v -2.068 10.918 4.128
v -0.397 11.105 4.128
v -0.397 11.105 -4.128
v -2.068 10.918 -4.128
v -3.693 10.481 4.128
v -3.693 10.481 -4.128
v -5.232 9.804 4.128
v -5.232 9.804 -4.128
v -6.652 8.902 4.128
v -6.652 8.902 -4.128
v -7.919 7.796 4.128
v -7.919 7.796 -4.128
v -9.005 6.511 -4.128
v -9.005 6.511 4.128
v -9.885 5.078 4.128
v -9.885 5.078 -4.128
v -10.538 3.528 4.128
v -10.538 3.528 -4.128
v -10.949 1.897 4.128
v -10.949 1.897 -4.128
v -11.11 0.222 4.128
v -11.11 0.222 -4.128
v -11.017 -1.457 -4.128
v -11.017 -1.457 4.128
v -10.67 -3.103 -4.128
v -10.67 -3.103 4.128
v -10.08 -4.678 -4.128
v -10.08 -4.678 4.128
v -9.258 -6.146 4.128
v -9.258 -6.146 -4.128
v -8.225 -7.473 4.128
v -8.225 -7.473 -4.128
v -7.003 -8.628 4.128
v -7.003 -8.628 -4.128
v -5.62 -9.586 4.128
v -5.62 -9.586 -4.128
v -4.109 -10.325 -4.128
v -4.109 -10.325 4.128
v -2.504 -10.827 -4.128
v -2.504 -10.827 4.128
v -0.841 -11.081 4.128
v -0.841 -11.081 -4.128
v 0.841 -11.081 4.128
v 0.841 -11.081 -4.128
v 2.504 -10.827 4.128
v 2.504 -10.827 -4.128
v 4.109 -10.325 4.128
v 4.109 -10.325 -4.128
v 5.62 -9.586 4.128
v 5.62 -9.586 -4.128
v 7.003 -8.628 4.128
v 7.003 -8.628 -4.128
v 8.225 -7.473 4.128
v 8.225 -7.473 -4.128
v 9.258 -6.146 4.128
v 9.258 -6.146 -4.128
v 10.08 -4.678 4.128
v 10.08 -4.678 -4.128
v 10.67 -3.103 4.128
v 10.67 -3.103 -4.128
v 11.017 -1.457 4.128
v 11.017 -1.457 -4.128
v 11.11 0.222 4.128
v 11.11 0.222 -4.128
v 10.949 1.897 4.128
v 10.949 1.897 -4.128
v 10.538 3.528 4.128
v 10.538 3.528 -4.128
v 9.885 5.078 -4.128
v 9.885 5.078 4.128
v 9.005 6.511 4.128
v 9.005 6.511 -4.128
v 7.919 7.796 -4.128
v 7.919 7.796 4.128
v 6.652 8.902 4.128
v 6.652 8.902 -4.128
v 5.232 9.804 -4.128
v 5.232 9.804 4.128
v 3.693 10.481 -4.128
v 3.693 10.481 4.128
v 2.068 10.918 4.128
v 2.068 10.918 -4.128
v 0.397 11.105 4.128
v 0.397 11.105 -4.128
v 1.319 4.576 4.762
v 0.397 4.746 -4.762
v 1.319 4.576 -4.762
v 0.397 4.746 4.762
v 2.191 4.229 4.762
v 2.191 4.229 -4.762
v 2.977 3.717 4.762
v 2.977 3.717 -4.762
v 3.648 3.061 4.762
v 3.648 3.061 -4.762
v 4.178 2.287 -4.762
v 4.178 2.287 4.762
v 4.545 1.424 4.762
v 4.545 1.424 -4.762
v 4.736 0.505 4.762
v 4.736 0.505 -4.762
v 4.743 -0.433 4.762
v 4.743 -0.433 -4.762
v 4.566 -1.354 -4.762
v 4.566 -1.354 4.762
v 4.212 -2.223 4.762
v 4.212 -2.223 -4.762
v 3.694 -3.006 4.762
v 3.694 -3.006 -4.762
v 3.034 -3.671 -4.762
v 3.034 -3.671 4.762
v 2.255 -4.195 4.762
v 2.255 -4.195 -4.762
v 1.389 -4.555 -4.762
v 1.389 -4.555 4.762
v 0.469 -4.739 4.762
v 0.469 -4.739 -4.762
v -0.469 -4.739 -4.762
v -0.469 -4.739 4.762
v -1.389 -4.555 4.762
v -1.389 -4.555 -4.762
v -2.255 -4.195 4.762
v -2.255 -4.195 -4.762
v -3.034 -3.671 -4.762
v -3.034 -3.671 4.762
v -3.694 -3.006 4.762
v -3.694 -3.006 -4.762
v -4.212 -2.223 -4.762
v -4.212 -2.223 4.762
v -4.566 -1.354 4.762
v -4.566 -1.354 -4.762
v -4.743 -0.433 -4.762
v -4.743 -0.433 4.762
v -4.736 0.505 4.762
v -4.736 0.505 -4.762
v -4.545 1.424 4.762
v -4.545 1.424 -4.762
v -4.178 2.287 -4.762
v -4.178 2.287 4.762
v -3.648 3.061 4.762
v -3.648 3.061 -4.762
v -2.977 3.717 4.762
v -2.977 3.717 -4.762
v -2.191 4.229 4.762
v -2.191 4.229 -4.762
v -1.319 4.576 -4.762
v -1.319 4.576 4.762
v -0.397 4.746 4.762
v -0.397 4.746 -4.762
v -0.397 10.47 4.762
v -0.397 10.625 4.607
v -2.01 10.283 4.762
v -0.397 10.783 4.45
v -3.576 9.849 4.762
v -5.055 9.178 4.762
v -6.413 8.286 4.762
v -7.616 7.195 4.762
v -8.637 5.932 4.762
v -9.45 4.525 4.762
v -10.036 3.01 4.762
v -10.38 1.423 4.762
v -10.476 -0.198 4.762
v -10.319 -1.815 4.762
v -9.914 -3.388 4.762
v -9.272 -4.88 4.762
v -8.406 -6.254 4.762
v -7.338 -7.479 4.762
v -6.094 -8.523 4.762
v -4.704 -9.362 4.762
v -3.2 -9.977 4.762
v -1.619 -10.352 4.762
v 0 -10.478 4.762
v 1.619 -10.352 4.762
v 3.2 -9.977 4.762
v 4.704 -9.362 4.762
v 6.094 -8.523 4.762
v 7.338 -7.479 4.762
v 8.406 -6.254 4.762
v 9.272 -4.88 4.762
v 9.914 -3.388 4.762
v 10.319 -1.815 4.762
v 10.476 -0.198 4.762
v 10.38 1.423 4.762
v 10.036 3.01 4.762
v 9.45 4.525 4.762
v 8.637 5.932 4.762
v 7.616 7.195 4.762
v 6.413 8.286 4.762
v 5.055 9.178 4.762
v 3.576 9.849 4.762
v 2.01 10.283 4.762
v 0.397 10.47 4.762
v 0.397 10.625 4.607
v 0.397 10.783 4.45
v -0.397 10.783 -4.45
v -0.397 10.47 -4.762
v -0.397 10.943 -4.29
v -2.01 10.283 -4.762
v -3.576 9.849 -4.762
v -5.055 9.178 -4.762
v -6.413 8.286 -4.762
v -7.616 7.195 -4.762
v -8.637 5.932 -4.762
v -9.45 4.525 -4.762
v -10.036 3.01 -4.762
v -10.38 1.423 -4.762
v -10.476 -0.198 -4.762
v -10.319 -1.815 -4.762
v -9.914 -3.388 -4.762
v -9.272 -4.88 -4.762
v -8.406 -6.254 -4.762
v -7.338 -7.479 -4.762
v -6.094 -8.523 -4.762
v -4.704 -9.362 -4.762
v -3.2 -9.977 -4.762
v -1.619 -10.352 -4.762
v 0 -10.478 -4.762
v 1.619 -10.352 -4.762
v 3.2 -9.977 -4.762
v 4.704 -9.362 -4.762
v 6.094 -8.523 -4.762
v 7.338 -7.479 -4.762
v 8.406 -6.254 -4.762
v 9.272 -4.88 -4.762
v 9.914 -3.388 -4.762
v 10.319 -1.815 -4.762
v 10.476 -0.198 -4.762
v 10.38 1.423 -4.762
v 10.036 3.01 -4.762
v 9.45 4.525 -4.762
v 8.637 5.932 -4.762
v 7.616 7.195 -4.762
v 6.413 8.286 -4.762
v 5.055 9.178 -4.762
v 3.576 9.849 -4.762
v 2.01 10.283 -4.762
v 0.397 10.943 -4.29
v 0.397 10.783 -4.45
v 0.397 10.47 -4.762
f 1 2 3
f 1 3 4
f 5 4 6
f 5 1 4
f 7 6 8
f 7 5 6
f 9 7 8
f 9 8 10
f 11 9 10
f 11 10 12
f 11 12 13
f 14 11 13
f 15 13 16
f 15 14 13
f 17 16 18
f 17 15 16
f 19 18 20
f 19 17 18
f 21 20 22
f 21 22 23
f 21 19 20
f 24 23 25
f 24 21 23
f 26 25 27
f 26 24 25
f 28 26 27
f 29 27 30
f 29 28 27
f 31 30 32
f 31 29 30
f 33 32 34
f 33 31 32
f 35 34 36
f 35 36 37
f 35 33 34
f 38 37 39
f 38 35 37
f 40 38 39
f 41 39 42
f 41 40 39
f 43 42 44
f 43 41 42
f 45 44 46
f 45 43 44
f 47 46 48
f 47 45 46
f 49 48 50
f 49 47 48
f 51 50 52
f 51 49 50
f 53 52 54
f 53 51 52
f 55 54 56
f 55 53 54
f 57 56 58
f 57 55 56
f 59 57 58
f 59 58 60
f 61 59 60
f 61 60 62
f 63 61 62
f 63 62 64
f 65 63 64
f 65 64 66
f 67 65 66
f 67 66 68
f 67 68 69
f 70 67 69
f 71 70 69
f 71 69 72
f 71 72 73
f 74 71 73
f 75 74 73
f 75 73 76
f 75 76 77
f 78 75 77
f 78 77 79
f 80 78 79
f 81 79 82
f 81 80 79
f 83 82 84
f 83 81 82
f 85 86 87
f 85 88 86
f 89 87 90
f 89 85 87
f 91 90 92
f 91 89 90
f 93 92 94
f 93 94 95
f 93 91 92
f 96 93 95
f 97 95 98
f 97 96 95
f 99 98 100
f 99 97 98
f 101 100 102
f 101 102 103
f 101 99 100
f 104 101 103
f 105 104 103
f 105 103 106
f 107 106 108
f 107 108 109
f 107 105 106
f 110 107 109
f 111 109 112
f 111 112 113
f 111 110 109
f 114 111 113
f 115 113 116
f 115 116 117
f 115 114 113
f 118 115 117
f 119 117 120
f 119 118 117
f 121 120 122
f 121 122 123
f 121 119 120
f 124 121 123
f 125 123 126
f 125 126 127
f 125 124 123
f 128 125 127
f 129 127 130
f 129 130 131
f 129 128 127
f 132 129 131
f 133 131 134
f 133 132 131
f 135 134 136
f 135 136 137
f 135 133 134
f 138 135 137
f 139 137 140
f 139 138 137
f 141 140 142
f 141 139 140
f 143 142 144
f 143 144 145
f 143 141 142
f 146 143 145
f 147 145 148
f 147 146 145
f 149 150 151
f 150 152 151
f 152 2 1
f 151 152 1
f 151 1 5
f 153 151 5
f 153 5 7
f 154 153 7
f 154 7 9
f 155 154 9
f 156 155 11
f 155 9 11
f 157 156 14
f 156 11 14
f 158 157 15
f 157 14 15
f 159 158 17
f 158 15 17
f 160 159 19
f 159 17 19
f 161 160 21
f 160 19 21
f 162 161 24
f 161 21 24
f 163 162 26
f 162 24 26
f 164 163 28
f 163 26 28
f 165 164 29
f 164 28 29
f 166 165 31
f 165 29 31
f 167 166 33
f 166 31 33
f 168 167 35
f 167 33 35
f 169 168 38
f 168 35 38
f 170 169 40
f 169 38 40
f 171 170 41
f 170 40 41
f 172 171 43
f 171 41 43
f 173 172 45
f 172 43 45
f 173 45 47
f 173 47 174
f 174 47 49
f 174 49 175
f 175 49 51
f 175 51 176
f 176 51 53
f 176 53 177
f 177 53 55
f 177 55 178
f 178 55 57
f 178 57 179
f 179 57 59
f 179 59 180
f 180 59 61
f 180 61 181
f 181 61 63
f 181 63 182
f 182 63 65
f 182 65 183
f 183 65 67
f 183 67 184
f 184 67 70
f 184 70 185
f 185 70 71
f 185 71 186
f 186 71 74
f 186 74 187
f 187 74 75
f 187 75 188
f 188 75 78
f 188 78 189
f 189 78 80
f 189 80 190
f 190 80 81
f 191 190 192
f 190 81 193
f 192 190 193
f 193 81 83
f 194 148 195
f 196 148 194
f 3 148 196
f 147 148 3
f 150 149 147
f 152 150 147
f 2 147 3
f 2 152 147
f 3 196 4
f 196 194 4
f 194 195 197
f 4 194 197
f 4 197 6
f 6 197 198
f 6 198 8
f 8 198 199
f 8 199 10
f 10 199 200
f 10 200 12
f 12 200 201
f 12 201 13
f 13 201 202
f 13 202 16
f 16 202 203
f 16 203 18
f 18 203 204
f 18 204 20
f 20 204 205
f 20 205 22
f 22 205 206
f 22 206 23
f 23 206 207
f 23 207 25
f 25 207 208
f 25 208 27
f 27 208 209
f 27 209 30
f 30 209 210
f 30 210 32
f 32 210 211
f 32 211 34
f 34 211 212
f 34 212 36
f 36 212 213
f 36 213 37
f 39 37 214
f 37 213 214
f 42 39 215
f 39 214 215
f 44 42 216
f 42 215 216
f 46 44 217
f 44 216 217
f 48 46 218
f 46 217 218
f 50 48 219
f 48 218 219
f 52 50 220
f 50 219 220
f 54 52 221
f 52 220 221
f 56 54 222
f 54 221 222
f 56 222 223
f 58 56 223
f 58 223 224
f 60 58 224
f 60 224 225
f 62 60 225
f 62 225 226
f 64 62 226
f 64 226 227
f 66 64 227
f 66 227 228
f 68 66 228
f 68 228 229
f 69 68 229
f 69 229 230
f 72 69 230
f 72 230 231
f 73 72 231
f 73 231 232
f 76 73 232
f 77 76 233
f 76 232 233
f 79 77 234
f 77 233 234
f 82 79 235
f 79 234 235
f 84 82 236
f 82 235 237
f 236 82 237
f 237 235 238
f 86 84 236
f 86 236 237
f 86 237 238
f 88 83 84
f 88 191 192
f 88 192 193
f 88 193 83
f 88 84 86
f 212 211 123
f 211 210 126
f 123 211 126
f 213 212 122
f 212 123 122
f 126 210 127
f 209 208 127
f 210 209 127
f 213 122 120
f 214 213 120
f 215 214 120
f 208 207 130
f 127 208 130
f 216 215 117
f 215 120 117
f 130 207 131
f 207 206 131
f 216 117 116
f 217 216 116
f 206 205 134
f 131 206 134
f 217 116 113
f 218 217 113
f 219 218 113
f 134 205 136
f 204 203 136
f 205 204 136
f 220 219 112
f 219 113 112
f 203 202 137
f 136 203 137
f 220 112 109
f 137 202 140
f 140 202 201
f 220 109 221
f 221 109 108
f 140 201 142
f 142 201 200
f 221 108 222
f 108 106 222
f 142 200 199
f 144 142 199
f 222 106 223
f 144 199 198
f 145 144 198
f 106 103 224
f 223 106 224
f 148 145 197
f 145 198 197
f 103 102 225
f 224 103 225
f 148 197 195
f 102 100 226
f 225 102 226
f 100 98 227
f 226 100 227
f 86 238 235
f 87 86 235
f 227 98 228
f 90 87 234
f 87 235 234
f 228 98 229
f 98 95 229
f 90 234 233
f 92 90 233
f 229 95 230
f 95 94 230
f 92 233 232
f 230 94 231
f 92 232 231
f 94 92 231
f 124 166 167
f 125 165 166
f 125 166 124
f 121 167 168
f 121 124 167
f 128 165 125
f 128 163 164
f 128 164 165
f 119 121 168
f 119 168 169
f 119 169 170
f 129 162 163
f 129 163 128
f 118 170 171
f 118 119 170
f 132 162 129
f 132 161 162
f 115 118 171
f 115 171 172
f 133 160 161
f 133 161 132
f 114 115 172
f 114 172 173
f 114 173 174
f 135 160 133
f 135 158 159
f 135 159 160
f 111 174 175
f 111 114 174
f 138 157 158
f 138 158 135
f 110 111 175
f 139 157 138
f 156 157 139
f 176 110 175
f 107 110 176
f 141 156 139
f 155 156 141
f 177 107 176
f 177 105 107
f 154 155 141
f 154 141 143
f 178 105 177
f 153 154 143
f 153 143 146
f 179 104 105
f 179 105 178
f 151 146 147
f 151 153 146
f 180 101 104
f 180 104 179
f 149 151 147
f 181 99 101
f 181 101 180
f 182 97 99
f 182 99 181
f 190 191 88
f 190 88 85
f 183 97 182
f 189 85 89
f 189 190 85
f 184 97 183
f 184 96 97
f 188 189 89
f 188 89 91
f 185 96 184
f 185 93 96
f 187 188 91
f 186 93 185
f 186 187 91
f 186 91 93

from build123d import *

# Parameters (mm, degrees)
EXTRUSION_DEPTH = 4.7625
CHAMFER1_SIZE   = 0.635


with BuildPart() as part:
    # profile → extrusion (new body, symmetric)
    with BuildSketch(Plane.XY):
        with BuildLine():
            Line((-0.396875, 4.745934732), (-0.396875, 11.105410685))
            ThreePointArc((-0.396875, 11.105410685), (0, -11.1125), (0.396875, 11.105410685))
            Line((0.396875, 11.105410685), (0.396875, 4.745934732))
            ThreePointArc((0.396875, 4.745934732), (0, -4.7625), (-0.396875, 4.745934732))
        make_face()
    extrude(amount=EXTRUSION_DEPTH, both=True)

    # Chamfer1
    chamfer1_edges = [part.edges().sort_by_distance(p)[0] for p in [
        (0, -11.1125, 4.7625),
        (0, -11.1125, -4.7625),
    ]]
    chamfer(chamfer1_edges, length=CHAMFER1_SIZE)


solid = part.part
